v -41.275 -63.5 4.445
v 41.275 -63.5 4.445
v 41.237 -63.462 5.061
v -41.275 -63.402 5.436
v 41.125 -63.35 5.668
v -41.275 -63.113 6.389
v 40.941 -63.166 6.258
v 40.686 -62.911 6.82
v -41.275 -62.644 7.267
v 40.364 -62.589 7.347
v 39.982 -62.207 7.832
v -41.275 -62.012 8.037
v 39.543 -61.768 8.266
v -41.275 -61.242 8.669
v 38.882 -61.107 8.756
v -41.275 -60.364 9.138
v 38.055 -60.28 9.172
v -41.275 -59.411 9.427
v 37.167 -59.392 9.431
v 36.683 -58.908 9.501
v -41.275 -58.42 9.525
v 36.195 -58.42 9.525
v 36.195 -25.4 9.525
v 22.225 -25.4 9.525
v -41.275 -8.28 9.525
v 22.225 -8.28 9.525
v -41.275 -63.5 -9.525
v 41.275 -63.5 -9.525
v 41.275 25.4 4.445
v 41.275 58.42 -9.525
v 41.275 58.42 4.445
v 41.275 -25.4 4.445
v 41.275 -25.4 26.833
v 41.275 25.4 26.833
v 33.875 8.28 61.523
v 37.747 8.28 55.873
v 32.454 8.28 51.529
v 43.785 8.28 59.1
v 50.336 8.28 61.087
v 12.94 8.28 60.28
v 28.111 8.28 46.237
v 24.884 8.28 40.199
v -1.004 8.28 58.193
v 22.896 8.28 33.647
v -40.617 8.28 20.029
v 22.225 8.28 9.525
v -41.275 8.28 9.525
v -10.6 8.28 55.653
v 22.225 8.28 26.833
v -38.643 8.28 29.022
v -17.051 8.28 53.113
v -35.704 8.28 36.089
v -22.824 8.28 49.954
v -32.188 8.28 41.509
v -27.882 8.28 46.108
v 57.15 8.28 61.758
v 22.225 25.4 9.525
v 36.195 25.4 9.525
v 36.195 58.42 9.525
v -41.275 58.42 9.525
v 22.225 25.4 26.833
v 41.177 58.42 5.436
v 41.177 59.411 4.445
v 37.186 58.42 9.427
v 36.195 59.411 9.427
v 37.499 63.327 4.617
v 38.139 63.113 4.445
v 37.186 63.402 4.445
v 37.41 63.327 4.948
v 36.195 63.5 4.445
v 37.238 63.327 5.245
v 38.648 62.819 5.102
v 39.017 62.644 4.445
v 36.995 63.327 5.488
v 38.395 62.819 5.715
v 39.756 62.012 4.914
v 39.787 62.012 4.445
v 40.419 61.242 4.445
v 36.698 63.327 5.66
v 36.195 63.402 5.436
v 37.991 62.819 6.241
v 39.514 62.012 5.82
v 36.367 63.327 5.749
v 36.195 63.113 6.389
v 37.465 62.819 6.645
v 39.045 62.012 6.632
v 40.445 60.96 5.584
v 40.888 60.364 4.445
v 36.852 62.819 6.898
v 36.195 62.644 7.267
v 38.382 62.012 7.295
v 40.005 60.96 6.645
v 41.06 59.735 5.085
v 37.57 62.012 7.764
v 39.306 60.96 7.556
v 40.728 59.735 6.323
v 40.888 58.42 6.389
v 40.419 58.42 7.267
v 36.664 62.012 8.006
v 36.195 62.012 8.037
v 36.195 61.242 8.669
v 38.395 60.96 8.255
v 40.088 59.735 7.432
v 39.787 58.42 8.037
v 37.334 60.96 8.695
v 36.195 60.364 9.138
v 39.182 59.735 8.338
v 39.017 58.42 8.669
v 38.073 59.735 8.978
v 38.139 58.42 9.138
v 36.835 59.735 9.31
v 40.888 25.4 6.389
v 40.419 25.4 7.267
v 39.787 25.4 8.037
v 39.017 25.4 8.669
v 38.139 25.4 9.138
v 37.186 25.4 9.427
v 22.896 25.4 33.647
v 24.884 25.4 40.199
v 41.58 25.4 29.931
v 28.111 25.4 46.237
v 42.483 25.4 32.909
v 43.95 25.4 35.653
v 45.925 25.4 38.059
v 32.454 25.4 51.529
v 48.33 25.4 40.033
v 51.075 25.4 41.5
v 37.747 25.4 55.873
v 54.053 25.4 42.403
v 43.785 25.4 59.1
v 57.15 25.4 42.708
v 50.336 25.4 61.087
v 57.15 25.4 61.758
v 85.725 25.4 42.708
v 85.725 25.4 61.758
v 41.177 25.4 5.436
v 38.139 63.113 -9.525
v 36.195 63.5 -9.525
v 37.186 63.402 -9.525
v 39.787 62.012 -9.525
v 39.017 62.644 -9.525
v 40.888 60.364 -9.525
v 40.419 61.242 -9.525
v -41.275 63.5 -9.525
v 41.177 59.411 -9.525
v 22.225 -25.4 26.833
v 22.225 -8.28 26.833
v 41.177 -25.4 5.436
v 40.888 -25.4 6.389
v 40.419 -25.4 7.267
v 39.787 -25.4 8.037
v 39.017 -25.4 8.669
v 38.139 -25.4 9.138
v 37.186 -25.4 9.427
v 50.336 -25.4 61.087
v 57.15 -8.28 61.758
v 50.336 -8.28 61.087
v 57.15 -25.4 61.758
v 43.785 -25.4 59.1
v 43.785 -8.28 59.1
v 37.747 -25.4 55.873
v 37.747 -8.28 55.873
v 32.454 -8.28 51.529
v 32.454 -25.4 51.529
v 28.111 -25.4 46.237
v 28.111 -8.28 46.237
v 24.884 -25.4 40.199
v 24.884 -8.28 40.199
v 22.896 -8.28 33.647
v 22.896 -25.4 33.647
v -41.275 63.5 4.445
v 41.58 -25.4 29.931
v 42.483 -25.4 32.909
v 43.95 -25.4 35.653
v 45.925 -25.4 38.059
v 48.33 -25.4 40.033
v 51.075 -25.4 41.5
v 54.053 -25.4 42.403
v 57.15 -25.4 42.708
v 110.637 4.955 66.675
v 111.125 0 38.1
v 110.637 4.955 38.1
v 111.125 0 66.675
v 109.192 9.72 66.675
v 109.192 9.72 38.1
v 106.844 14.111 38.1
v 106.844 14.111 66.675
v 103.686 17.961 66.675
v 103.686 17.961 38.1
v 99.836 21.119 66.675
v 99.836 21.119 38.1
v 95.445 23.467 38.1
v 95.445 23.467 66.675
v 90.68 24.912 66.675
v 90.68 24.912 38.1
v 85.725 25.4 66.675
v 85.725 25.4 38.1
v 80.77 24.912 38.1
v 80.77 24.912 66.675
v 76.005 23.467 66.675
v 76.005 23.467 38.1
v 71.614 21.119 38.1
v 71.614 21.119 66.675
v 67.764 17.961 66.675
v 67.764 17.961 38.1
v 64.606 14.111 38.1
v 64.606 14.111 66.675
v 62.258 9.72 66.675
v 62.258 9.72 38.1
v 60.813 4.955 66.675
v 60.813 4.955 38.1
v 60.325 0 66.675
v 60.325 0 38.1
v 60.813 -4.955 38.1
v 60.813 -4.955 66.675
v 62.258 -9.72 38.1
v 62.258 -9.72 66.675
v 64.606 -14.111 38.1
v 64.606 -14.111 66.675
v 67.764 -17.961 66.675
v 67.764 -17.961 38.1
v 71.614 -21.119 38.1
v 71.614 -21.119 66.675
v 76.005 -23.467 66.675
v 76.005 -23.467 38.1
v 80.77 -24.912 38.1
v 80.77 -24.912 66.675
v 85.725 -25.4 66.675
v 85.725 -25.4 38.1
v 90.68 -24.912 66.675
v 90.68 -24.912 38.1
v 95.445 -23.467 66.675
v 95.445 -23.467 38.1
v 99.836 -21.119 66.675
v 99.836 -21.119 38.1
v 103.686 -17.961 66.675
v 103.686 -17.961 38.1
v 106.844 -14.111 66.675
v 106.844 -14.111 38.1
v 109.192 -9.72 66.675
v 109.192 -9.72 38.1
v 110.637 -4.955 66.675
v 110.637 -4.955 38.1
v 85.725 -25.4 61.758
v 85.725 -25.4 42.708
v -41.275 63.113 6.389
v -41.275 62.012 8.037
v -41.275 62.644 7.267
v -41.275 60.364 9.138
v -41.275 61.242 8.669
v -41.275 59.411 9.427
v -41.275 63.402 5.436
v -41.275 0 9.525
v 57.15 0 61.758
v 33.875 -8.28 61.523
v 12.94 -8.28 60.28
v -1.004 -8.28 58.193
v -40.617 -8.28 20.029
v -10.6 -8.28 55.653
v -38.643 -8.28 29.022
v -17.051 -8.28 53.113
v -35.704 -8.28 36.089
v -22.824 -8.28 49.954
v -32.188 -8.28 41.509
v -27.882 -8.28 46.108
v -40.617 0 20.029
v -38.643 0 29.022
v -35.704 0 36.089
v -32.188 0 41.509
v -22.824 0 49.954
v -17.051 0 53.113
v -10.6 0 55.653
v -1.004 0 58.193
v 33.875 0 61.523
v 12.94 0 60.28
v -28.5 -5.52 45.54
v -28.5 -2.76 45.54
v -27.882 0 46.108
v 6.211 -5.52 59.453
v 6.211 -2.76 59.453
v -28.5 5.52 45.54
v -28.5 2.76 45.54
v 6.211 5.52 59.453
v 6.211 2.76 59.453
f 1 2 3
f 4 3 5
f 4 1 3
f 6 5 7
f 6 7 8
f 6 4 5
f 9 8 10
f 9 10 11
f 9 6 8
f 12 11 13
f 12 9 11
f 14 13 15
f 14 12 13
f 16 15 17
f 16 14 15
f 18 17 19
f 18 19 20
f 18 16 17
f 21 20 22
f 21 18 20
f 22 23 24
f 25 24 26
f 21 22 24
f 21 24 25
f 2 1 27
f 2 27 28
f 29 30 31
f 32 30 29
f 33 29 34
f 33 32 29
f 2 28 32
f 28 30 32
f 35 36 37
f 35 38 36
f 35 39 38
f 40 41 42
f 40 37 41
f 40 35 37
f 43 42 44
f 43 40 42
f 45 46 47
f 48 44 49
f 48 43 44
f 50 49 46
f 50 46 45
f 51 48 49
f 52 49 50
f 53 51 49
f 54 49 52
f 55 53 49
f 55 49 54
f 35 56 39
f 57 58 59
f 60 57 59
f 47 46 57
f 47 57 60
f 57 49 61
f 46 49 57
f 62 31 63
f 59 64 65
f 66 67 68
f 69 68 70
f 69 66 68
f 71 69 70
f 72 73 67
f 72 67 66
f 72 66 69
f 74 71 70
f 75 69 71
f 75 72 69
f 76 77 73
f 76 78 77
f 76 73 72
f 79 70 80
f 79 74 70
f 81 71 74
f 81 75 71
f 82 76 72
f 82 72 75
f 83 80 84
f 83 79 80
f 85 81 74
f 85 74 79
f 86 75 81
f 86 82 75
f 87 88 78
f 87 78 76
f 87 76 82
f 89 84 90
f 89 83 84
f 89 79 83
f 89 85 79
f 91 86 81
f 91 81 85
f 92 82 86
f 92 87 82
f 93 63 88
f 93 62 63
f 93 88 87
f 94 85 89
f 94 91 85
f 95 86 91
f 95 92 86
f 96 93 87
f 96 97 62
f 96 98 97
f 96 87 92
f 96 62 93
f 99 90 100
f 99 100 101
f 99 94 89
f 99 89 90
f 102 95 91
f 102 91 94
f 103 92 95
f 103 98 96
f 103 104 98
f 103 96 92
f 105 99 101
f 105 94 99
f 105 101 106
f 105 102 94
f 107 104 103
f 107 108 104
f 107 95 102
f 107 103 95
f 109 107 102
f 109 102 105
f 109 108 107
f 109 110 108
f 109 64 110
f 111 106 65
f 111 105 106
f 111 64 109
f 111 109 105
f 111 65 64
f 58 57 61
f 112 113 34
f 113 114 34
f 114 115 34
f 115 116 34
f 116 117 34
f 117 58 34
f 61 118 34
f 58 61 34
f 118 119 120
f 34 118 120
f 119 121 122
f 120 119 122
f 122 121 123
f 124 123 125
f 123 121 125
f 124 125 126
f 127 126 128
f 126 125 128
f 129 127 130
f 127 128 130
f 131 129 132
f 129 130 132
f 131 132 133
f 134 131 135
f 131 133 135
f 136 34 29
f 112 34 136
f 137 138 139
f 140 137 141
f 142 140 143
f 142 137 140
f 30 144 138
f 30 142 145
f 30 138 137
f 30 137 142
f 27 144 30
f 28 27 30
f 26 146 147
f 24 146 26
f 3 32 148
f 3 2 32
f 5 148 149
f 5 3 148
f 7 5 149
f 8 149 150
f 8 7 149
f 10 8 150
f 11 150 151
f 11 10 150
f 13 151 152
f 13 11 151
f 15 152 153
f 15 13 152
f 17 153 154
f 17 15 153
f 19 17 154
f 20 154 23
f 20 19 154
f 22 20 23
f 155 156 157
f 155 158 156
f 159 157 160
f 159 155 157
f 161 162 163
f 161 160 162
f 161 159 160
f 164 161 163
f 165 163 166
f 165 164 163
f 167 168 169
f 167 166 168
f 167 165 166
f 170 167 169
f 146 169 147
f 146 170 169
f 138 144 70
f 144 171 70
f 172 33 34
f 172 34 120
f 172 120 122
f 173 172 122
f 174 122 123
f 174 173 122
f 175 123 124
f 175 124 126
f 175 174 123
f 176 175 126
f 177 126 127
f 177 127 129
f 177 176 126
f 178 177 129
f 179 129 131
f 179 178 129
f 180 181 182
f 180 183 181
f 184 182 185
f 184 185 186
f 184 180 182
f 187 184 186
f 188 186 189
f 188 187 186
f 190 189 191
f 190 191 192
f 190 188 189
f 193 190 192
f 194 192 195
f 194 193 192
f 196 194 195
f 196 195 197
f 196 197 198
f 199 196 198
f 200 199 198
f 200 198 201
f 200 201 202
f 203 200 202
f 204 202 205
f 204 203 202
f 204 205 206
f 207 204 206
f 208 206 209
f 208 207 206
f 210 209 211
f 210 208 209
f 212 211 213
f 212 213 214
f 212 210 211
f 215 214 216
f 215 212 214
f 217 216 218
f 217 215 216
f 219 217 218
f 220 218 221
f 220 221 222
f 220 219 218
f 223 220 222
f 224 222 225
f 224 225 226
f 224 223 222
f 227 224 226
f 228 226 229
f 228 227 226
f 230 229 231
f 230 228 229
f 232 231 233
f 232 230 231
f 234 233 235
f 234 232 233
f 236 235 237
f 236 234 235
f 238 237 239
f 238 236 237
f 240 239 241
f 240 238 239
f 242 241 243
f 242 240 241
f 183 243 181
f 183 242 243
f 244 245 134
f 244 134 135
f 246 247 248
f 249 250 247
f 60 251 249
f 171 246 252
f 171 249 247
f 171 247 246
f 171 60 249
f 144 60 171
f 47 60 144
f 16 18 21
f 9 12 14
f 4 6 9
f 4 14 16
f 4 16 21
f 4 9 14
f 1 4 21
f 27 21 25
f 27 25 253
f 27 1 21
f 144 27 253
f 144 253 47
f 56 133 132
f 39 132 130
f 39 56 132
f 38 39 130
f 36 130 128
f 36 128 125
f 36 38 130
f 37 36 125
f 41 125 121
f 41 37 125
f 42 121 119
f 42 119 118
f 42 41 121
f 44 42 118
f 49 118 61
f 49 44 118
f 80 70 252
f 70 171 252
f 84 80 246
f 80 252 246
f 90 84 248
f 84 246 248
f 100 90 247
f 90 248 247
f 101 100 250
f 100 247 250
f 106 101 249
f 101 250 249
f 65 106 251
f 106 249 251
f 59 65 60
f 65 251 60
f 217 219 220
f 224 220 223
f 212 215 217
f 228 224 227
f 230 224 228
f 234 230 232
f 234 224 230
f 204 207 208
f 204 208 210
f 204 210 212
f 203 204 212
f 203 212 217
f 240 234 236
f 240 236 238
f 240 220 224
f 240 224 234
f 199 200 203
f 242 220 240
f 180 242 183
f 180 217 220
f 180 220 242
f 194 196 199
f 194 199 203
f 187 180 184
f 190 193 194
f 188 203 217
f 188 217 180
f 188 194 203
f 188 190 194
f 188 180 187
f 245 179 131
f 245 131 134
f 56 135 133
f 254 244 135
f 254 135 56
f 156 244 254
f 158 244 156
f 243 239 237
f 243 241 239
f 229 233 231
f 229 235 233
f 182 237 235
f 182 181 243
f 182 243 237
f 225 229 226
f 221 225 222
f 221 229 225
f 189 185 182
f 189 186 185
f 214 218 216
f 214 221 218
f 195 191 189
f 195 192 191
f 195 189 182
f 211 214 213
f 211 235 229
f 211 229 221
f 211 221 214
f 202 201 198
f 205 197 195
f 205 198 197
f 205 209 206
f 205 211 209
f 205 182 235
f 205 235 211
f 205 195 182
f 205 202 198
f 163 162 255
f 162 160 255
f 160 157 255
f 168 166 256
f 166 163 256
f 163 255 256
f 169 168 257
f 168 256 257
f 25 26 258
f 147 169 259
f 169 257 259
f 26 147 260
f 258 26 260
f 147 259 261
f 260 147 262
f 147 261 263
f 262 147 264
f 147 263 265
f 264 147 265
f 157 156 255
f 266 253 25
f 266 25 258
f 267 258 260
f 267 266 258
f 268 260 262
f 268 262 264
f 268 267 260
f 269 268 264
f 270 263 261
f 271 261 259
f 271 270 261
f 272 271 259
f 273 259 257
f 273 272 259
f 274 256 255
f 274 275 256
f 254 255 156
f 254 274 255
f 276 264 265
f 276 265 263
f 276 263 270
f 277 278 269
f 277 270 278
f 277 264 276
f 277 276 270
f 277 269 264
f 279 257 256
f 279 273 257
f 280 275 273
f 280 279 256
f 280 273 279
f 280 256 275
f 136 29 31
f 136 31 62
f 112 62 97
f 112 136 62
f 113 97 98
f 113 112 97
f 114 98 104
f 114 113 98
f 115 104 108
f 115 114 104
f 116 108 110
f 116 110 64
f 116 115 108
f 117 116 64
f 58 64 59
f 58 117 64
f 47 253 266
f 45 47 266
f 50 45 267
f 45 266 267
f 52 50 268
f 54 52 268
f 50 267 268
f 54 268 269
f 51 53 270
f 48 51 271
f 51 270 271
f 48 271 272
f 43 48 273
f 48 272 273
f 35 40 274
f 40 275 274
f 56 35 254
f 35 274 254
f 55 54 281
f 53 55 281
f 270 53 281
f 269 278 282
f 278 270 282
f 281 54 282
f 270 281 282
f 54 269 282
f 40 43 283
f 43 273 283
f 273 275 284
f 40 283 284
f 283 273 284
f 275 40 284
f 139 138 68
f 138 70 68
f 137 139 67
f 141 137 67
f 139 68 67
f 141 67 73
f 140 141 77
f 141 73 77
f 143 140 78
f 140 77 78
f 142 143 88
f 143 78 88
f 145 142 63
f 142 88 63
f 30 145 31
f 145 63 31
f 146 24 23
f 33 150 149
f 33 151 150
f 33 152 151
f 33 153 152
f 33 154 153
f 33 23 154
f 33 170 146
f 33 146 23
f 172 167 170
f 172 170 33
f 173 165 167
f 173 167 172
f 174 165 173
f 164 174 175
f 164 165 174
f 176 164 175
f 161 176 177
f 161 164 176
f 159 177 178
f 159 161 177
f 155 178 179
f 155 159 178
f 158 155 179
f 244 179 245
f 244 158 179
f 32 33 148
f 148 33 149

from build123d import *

# Parameters (mm, degrees)
F1_DEPTH = 63.5
F0_W     = 25.4
F0_H     = 19.05
F2_DEPTH = 25.4
F3_DEPTH = 8.2804
F5_R     = 5.08


with BuildPart() as f1:
    # F0 (on Front) → F1 (new body, symmetric)
    with BuildSketch(Plane.XZ):
        Polygon((-41.275, -9.525), (41.275, -9.525), (41.275, 9.525), (22.225, 9.525), (-41.275, 9.525), align=None)
    extrude(amount=F1_DEPTH, both=True)

    # F0 (on Front) → F2 (join, symmetric)
    with BuildSketch(Plane.XZ):
        with BuildLine():
            Line((22.225, 9.525), (41.275, 9.525))
            Line((41.275, 9.525), (41.275, 26.8334691807))
            ThreePointArc((41.275, 26.8334691807), (45.9246798487, 38.058789332), (57.15, 42.7084691807))
            Line((57.15, 42.7084691807), (60.325, 42.7084691807))
            Line((60.325, 42.7084691807), (60.325, 61.7584691807))
            Line((60.325, 61.7584691807), (57.15, 61.7584691807))
            ThreePointArc((57.15, 61.7584691807), (32.4542956671, 51.5291735137), (22.225, 26.8334691807))
            Line((22.225, 26.8334691807), (22.225, 9.525))
        make_face()
        with Locations((73.025, 52.2334691807)):
            Rectangle(F0_W, F0_H)
    extrude(amount=F2_DEPTH, both=True)

    # F0 (on Front) → F3 (join, symmetric)
    with BuildSketch(Plane.XZ):
        with BuildLine():
            add(Edge.make_bspline(
                [(-41.275, 9.525), (-41.3716472685, 60.0888580084), (0, 61.7584691807), (57.15, 61.7584691807)],
                knots=[0, 0, 0, 0, 111.4262802379, 111.4262802379, 111.4262802379, 111.4262802379], degree=3))
            Line((-41.275, 9.525), (22.225, 9.525))
            Line((22.225, 9.525), (22.225, 26.8334691807))
            ThreePointArc((22.225, 26.8334691807), (32.4542956671, 51.5291735137), (57.15, 61.7584691807))
        make_face()
    extrude(amount=F3_DEPTH, both=True)

    # F5
    f5_edges = [f1.edges().sort_by_distance(p)[0] for p in [
        (0, -63.5, 9.525),
        (41.275, -44.45, 9.525),
        (41.275, 44.45, 9.525),
        (41.275, 63.5, 0),
        (0, 63.5, 9.525),
    ]]
    fillet(f5_edges, radius=F5_R)


with BuildPart() as f4:
    # F0 (on Front) → F4 (revolve)
    with BuildSketch(Plane.XZ):
        Polygon((85.725, 66.675), (85.725, 61.7584691807), (85.725, 42.7084691807), (85.725, 38.1), (111.125, 38.1), (111.125, 66.675), align=None)
    revolve(axis=Axis((85.725, 0, 52.3875), (0, 0, 1)))


solid = Compound([f1.part, f4.part])
